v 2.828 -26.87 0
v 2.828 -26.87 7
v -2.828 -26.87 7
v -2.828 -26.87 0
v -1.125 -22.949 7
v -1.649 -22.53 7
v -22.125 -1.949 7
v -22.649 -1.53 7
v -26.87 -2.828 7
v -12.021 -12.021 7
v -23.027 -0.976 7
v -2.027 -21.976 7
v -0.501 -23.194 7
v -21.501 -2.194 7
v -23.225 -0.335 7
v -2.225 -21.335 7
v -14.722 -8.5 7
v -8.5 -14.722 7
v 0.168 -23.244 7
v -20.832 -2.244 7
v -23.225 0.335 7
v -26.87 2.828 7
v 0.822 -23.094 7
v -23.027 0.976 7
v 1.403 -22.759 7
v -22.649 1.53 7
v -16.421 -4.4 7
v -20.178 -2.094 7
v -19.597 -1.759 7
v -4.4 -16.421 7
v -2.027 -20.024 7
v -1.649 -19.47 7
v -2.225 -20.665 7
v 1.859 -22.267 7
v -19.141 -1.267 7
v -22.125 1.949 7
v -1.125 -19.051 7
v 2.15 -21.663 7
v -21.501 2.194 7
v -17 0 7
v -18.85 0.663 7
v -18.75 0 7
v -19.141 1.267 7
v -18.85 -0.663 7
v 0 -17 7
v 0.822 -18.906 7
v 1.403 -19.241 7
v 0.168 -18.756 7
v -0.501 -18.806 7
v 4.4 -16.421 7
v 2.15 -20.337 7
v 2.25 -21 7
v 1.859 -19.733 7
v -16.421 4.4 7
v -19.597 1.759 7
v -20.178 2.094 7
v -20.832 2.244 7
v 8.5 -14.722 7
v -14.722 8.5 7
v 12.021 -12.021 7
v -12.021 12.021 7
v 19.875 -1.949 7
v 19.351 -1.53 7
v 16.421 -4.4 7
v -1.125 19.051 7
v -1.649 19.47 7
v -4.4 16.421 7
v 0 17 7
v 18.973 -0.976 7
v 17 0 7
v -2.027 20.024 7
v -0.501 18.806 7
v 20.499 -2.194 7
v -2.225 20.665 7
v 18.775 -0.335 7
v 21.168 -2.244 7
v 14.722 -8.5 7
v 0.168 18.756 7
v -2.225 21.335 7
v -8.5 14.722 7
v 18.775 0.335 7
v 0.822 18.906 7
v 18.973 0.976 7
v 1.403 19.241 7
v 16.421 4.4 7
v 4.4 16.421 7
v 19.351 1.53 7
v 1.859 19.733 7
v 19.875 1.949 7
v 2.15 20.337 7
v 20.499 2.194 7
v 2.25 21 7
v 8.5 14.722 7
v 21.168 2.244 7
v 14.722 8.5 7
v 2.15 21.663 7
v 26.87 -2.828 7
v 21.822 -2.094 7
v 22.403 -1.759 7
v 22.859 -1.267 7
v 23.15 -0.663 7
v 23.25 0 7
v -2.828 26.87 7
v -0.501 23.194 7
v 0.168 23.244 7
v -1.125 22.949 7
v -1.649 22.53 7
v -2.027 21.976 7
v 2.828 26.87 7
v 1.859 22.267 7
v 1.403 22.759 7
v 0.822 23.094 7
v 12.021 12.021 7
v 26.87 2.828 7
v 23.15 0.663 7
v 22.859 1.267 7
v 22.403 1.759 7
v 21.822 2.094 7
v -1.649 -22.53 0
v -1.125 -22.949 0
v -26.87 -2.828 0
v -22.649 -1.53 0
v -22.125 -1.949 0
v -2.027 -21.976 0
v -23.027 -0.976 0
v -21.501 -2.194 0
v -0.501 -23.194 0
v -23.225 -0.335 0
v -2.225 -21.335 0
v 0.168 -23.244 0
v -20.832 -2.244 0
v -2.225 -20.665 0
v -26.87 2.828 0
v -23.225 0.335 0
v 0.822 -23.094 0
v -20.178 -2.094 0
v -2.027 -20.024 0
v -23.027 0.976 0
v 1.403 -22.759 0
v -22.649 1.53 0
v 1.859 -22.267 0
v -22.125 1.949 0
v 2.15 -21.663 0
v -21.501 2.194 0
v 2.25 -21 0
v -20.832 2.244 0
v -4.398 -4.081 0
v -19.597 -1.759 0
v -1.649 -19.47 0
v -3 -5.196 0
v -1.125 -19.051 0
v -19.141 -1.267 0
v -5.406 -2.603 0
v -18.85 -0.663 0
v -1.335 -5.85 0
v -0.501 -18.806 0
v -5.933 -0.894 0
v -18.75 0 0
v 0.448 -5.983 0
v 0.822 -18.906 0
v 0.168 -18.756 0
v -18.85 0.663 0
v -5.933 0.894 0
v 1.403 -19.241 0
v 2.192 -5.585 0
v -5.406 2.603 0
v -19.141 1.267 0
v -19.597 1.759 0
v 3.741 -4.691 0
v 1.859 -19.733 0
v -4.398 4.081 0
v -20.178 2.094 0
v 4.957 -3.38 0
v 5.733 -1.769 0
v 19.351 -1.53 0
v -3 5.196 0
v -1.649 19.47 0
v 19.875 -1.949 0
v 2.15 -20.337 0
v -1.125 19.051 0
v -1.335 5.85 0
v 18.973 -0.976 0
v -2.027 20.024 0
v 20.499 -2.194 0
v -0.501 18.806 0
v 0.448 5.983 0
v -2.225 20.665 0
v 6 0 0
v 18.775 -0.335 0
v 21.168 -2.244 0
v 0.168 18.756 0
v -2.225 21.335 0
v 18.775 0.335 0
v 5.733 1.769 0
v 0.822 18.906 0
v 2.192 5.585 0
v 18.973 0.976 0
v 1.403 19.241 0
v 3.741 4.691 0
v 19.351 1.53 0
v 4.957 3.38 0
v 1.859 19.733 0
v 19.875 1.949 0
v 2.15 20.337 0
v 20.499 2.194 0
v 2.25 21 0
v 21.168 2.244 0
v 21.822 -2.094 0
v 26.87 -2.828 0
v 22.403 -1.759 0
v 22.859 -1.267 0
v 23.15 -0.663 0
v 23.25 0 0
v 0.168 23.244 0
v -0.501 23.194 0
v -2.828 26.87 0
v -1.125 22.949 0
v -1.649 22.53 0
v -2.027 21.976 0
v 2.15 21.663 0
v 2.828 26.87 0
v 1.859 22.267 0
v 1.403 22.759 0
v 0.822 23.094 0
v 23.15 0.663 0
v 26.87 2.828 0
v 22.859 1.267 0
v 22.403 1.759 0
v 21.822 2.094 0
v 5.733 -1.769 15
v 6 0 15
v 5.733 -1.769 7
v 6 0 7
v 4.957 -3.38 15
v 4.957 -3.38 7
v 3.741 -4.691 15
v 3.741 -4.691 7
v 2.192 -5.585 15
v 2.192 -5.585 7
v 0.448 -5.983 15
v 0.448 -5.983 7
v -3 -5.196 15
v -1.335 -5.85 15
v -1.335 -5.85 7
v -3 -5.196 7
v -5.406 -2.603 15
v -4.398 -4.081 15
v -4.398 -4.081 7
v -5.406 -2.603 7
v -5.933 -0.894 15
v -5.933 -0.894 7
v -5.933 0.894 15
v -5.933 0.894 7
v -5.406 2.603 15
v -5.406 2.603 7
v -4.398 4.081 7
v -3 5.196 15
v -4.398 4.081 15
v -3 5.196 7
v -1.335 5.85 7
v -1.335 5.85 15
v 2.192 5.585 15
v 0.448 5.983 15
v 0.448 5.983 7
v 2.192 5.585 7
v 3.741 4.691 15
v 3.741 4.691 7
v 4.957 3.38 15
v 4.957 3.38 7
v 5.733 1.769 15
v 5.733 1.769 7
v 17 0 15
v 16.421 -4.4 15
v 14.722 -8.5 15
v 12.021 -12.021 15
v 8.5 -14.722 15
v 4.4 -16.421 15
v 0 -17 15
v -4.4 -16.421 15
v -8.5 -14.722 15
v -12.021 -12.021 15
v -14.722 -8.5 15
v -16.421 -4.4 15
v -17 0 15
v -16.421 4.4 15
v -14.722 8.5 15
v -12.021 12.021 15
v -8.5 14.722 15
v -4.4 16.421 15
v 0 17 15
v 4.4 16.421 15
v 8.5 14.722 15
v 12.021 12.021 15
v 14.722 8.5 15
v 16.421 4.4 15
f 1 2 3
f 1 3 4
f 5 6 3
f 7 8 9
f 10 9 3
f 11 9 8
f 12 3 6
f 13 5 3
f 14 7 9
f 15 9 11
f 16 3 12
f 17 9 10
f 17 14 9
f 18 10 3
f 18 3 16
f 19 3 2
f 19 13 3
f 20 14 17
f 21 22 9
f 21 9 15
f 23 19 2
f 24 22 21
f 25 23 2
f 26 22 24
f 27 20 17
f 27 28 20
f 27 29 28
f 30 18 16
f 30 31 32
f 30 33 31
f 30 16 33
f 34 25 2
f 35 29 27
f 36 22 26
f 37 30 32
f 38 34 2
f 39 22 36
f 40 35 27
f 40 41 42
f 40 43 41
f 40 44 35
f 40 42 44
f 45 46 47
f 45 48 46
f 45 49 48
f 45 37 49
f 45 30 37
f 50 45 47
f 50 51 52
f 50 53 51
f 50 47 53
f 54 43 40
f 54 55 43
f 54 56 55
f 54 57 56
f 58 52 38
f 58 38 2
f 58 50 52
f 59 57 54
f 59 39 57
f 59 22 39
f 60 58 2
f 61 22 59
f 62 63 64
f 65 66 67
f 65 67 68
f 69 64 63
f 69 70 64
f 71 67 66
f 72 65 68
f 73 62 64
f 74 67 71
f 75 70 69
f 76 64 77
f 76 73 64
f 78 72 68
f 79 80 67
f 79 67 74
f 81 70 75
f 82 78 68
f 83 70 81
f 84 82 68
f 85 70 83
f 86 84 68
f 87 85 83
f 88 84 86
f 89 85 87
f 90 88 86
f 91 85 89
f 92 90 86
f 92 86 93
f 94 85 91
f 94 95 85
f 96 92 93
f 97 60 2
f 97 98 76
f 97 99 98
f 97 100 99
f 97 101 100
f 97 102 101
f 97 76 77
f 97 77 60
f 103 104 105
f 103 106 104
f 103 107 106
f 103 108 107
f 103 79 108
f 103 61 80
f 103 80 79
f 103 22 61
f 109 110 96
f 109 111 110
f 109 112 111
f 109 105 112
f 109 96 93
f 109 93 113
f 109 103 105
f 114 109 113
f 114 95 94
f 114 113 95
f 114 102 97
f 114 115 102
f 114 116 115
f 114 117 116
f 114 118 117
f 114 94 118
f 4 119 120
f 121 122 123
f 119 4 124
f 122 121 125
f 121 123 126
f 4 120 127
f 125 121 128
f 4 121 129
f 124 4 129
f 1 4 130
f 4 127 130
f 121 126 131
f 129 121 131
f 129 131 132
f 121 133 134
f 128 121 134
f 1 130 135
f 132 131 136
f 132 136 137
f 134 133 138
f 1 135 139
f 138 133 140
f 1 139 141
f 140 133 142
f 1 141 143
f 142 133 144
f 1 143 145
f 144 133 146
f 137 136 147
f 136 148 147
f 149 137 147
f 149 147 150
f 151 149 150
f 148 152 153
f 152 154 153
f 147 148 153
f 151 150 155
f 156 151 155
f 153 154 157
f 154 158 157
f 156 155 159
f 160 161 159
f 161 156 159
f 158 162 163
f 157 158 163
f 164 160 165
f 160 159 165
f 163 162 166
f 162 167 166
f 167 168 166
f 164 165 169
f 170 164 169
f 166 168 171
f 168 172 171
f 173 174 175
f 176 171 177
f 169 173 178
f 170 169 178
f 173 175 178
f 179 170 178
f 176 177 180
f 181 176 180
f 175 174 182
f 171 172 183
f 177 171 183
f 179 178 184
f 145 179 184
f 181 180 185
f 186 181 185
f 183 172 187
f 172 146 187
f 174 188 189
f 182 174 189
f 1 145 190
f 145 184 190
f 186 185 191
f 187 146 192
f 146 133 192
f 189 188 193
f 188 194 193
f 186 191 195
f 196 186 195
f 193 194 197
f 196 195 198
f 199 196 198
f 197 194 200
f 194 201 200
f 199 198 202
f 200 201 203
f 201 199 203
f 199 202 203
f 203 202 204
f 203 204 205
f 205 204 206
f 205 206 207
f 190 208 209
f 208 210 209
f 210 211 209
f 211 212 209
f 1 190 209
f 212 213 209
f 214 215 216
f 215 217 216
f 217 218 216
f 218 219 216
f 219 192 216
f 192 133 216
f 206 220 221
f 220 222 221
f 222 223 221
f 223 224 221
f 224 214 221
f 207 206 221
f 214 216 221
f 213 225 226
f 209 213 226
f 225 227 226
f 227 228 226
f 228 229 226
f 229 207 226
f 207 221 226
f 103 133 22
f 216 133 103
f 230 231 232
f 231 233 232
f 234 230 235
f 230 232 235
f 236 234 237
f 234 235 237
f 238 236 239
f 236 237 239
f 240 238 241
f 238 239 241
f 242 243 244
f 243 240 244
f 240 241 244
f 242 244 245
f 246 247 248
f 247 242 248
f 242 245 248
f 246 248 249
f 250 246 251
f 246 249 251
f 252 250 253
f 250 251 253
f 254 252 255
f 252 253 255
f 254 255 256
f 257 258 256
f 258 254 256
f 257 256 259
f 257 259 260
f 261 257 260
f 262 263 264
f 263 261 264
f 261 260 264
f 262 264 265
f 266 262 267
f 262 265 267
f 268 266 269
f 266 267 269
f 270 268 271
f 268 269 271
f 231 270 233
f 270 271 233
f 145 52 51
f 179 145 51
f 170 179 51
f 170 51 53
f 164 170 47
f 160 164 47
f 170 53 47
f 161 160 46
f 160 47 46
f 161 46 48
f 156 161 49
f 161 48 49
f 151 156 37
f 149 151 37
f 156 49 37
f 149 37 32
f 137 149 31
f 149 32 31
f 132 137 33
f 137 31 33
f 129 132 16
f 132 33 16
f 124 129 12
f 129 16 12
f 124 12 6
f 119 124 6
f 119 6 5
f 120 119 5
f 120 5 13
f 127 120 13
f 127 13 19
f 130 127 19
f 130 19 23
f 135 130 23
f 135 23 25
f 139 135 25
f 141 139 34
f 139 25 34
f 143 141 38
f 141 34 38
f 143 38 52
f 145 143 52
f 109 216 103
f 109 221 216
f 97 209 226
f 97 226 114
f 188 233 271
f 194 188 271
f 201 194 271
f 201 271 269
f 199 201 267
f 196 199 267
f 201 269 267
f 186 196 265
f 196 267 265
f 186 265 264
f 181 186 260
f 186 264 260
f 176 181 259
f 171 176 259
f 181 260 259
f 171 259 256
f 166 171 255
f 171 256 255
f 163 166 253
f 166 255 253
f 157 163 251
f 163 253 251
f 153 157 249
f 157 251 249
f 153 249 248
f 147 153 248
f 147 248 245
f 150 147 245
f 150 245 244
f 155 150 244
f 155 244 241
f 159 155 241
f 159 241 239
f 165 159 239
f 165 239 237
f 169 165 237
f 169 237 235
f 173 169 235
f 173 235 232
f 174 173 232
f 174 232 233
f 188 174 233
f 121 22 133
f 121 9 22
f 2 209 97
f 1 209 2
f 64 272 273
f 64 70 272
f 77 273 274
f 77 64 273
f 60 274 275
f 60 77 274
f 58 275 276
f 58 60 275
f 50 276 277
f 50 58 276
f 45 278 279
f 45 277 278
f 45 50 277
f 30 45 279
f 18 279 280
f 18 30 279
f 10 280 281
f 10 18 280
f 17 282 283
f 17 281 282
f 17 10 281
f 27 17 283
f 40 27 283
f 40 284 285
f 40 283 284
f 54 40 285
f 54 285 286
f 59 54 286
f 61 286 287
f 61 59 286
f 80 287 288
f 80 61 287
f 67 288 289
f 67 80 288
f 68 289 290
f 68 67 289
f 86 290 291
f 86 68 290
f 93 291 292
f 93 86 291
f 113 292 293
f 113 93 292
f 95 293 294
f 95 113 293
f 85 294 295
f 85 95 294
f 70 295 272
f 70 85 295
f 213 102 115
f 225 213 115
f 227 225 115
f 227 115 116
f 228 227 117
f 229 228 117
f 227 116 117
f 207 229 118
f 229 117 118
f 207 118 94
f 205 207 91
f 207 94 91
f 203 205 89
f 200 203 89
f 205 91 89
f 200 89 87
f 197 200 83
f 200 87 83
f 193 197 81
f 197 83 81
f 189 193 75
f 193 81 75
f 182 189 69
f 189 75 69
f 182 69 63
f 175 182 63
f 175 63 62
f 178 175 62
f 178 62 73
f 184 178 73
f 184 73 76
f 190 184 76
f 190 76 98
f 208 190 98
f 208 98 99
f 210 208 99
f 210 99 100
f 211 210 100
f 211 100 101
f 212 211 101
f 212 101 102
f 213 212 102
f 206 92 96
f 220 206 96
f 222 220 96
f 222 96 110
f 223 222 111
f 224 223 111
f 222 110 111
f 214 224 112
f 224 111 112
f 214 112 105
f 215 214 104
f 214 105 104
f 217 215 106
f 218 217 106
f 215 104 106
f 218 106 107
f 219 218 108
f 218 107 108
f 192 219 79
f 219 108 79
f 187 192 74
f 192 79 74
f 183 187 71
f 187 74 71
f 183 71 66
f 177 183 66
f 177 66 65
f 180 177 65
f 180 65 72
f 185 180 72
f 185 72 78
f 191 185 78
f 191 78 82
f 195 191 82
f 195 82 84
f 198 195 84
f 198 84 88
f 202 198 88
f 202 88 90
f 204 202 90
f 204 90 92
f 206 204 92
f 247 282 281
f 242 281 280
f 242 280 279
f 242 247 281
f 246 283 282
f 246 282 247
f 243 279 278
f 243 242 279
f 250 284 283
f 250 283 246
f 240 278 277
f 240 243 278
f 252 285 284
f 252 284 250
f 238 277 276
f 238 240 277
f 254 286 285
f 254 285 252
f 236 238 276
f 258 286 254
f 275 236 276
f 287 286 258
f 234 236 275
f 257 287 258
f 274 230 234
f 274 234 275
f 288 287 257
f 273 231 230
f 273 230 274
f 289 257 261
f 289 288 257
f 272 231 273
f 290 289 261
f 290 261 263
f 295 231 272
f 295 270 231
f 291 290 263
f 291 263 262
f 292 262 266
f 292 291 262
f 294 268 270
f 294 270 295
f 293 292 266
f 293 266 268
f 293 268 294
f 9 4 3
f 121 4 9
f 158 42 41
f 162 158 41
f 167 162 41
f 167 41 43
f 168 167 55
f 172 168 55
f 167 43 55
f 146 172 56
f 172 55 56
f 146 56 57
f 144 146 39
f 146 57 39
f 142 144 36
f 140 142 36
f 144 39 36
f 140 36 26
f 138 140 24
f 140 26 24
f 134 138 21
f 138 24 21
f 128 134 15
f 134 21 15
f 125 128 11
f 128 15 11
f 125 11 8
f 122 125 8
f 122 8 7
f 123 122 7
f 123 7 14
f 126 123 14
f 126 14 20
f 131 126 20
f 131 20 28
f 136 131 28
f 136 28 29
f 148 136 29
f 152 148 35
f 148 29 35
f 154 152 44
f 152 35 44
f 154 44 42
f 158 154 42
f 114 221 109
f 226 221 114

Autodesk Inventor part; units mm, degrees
ref_plane "YZ Plane" through (0, 0, 0) normal (1, 0, 0) x (0, 1, 0)
ref_plane "XZ Plane" through (0, 0, 0) normal (0, 1, 0) x (-1, 0, 0)
ref_plane "XY Plane" through (0, 0, 0) normal (0, 0, 1) x (1, 0, 0)
sketch "Sketch1" plane through (0, 0, 0) normal (0, 0, 1) x (1, 0, 0)
  circle A0 centre (0, 0) radius 17 construction
  circle A1 centre (0, 0) radius 6 construction
  line L0 (-29.6985, 0) -> (0, 29.6985)
  line L1 (0, 29.6985) -> (29.6985, 0)
  line L2 (29.6985, 0) -> (0, -29.6985)
  line L3 (0, -29.6985) -> (-29.6985, 0)
  line L4 (-29.6985, 0) -> (29.6985, 0) construction
  line L5 (0, 29.6985) -> (0, -29.6985) construction
  point P0 (0, 21)
  point P1 (21, 0)
  point P2 (-21, 0)
  point P3 (0, -21)
  dimension "d0" = 34
  dimension "d1" = 12
  dimension "d2" = 21
  dimension "d3" = 21
  dimension "d4" = 21
  dimension "d5" = 21
  dimension "d6" = 21
  dimension "d7" = 42
  dimension "d8" = 42
extrude "Extrusion1" add sketch "Sketch1" along normal blind 7
sketch "Sketch2" plane through (0, 0, 7) normal (0, 0, 1) x (1, 0, 0)
  circle A0 centre (0, 0) radius 6
  circle A1 centre (0, 0) radius 18
  circle A2 centre (0, 21) radius 2.25
  circle A3 centre (21, 0) radius 2.25
  circle A4 centre (0, -21) radius 2.25
  circle A5 centre (-21, 0) radius 2.25
  dimension "d11" = 12
  dimension "d12" = 36
  dimension "d13" = 4.5
  dimension "d14" = 4.5
  dimension "d15" = 4.5
  dimension "d16" = 4.5
  dimension "d17" = 21
  dimension "d18" = 21
  dimension "d19" = 21
  dimension "d20" = 21
extrude "Extrusion2" cut sketch "Sketch2" against normal blind 20 contours A2 | A3 | A4 | A5
sketch "Sketch3" plane through (0, 0, 7) normal (0, 0, 1) x (1, 0, 0)
  circle A0 centre (0, 0) radius 17
  circle A1 centre (0, 0) radius 6
  dimension "d23" = 34
  dimension "d24" = 12
extrude "Extrusion3" cut sketch "Sketch3" against normal blind 20 contours A1
sketch "Sketch4" plane through (0, 0, 7) normal (0, 0, 1) x (1, 0, 0)
  circle A0 centre (0, 0) radius 6 projected
  circle A1 centre (0, 0) radius 17
  dimension "d27" = 34
extrude "Extrusion4" add sketch "Sketch4" along normal blind 8
chamfer "Chamfer1" distance 4 angle 45 1 edges at (0, 29.6985, 3.5)
chamfer "Chamfer2" distance 4 angle 45 1 edges at (29.6985, 0, 3.5)
chamfer "Chamfer3" distance 4 angle 45 1 edges at (-29.6985, 0, 3.5)
chamfer "Chamfer4" distance 4 angle 45 1 edges at (0, -29.6985, 3.5)
equation "\"d2\" = d3"
equation "\"d4\" = d3"
equation "\"d5\" = d3"
equation "\"d14\" = d13"
equation "\"d15\" = d13"
equation "\"d16\" = d13"
equation "\"d18\" = d17"
equation "\"d19\" = d17"
equation "\"d20\" = d17"
properties part number "ff12"
